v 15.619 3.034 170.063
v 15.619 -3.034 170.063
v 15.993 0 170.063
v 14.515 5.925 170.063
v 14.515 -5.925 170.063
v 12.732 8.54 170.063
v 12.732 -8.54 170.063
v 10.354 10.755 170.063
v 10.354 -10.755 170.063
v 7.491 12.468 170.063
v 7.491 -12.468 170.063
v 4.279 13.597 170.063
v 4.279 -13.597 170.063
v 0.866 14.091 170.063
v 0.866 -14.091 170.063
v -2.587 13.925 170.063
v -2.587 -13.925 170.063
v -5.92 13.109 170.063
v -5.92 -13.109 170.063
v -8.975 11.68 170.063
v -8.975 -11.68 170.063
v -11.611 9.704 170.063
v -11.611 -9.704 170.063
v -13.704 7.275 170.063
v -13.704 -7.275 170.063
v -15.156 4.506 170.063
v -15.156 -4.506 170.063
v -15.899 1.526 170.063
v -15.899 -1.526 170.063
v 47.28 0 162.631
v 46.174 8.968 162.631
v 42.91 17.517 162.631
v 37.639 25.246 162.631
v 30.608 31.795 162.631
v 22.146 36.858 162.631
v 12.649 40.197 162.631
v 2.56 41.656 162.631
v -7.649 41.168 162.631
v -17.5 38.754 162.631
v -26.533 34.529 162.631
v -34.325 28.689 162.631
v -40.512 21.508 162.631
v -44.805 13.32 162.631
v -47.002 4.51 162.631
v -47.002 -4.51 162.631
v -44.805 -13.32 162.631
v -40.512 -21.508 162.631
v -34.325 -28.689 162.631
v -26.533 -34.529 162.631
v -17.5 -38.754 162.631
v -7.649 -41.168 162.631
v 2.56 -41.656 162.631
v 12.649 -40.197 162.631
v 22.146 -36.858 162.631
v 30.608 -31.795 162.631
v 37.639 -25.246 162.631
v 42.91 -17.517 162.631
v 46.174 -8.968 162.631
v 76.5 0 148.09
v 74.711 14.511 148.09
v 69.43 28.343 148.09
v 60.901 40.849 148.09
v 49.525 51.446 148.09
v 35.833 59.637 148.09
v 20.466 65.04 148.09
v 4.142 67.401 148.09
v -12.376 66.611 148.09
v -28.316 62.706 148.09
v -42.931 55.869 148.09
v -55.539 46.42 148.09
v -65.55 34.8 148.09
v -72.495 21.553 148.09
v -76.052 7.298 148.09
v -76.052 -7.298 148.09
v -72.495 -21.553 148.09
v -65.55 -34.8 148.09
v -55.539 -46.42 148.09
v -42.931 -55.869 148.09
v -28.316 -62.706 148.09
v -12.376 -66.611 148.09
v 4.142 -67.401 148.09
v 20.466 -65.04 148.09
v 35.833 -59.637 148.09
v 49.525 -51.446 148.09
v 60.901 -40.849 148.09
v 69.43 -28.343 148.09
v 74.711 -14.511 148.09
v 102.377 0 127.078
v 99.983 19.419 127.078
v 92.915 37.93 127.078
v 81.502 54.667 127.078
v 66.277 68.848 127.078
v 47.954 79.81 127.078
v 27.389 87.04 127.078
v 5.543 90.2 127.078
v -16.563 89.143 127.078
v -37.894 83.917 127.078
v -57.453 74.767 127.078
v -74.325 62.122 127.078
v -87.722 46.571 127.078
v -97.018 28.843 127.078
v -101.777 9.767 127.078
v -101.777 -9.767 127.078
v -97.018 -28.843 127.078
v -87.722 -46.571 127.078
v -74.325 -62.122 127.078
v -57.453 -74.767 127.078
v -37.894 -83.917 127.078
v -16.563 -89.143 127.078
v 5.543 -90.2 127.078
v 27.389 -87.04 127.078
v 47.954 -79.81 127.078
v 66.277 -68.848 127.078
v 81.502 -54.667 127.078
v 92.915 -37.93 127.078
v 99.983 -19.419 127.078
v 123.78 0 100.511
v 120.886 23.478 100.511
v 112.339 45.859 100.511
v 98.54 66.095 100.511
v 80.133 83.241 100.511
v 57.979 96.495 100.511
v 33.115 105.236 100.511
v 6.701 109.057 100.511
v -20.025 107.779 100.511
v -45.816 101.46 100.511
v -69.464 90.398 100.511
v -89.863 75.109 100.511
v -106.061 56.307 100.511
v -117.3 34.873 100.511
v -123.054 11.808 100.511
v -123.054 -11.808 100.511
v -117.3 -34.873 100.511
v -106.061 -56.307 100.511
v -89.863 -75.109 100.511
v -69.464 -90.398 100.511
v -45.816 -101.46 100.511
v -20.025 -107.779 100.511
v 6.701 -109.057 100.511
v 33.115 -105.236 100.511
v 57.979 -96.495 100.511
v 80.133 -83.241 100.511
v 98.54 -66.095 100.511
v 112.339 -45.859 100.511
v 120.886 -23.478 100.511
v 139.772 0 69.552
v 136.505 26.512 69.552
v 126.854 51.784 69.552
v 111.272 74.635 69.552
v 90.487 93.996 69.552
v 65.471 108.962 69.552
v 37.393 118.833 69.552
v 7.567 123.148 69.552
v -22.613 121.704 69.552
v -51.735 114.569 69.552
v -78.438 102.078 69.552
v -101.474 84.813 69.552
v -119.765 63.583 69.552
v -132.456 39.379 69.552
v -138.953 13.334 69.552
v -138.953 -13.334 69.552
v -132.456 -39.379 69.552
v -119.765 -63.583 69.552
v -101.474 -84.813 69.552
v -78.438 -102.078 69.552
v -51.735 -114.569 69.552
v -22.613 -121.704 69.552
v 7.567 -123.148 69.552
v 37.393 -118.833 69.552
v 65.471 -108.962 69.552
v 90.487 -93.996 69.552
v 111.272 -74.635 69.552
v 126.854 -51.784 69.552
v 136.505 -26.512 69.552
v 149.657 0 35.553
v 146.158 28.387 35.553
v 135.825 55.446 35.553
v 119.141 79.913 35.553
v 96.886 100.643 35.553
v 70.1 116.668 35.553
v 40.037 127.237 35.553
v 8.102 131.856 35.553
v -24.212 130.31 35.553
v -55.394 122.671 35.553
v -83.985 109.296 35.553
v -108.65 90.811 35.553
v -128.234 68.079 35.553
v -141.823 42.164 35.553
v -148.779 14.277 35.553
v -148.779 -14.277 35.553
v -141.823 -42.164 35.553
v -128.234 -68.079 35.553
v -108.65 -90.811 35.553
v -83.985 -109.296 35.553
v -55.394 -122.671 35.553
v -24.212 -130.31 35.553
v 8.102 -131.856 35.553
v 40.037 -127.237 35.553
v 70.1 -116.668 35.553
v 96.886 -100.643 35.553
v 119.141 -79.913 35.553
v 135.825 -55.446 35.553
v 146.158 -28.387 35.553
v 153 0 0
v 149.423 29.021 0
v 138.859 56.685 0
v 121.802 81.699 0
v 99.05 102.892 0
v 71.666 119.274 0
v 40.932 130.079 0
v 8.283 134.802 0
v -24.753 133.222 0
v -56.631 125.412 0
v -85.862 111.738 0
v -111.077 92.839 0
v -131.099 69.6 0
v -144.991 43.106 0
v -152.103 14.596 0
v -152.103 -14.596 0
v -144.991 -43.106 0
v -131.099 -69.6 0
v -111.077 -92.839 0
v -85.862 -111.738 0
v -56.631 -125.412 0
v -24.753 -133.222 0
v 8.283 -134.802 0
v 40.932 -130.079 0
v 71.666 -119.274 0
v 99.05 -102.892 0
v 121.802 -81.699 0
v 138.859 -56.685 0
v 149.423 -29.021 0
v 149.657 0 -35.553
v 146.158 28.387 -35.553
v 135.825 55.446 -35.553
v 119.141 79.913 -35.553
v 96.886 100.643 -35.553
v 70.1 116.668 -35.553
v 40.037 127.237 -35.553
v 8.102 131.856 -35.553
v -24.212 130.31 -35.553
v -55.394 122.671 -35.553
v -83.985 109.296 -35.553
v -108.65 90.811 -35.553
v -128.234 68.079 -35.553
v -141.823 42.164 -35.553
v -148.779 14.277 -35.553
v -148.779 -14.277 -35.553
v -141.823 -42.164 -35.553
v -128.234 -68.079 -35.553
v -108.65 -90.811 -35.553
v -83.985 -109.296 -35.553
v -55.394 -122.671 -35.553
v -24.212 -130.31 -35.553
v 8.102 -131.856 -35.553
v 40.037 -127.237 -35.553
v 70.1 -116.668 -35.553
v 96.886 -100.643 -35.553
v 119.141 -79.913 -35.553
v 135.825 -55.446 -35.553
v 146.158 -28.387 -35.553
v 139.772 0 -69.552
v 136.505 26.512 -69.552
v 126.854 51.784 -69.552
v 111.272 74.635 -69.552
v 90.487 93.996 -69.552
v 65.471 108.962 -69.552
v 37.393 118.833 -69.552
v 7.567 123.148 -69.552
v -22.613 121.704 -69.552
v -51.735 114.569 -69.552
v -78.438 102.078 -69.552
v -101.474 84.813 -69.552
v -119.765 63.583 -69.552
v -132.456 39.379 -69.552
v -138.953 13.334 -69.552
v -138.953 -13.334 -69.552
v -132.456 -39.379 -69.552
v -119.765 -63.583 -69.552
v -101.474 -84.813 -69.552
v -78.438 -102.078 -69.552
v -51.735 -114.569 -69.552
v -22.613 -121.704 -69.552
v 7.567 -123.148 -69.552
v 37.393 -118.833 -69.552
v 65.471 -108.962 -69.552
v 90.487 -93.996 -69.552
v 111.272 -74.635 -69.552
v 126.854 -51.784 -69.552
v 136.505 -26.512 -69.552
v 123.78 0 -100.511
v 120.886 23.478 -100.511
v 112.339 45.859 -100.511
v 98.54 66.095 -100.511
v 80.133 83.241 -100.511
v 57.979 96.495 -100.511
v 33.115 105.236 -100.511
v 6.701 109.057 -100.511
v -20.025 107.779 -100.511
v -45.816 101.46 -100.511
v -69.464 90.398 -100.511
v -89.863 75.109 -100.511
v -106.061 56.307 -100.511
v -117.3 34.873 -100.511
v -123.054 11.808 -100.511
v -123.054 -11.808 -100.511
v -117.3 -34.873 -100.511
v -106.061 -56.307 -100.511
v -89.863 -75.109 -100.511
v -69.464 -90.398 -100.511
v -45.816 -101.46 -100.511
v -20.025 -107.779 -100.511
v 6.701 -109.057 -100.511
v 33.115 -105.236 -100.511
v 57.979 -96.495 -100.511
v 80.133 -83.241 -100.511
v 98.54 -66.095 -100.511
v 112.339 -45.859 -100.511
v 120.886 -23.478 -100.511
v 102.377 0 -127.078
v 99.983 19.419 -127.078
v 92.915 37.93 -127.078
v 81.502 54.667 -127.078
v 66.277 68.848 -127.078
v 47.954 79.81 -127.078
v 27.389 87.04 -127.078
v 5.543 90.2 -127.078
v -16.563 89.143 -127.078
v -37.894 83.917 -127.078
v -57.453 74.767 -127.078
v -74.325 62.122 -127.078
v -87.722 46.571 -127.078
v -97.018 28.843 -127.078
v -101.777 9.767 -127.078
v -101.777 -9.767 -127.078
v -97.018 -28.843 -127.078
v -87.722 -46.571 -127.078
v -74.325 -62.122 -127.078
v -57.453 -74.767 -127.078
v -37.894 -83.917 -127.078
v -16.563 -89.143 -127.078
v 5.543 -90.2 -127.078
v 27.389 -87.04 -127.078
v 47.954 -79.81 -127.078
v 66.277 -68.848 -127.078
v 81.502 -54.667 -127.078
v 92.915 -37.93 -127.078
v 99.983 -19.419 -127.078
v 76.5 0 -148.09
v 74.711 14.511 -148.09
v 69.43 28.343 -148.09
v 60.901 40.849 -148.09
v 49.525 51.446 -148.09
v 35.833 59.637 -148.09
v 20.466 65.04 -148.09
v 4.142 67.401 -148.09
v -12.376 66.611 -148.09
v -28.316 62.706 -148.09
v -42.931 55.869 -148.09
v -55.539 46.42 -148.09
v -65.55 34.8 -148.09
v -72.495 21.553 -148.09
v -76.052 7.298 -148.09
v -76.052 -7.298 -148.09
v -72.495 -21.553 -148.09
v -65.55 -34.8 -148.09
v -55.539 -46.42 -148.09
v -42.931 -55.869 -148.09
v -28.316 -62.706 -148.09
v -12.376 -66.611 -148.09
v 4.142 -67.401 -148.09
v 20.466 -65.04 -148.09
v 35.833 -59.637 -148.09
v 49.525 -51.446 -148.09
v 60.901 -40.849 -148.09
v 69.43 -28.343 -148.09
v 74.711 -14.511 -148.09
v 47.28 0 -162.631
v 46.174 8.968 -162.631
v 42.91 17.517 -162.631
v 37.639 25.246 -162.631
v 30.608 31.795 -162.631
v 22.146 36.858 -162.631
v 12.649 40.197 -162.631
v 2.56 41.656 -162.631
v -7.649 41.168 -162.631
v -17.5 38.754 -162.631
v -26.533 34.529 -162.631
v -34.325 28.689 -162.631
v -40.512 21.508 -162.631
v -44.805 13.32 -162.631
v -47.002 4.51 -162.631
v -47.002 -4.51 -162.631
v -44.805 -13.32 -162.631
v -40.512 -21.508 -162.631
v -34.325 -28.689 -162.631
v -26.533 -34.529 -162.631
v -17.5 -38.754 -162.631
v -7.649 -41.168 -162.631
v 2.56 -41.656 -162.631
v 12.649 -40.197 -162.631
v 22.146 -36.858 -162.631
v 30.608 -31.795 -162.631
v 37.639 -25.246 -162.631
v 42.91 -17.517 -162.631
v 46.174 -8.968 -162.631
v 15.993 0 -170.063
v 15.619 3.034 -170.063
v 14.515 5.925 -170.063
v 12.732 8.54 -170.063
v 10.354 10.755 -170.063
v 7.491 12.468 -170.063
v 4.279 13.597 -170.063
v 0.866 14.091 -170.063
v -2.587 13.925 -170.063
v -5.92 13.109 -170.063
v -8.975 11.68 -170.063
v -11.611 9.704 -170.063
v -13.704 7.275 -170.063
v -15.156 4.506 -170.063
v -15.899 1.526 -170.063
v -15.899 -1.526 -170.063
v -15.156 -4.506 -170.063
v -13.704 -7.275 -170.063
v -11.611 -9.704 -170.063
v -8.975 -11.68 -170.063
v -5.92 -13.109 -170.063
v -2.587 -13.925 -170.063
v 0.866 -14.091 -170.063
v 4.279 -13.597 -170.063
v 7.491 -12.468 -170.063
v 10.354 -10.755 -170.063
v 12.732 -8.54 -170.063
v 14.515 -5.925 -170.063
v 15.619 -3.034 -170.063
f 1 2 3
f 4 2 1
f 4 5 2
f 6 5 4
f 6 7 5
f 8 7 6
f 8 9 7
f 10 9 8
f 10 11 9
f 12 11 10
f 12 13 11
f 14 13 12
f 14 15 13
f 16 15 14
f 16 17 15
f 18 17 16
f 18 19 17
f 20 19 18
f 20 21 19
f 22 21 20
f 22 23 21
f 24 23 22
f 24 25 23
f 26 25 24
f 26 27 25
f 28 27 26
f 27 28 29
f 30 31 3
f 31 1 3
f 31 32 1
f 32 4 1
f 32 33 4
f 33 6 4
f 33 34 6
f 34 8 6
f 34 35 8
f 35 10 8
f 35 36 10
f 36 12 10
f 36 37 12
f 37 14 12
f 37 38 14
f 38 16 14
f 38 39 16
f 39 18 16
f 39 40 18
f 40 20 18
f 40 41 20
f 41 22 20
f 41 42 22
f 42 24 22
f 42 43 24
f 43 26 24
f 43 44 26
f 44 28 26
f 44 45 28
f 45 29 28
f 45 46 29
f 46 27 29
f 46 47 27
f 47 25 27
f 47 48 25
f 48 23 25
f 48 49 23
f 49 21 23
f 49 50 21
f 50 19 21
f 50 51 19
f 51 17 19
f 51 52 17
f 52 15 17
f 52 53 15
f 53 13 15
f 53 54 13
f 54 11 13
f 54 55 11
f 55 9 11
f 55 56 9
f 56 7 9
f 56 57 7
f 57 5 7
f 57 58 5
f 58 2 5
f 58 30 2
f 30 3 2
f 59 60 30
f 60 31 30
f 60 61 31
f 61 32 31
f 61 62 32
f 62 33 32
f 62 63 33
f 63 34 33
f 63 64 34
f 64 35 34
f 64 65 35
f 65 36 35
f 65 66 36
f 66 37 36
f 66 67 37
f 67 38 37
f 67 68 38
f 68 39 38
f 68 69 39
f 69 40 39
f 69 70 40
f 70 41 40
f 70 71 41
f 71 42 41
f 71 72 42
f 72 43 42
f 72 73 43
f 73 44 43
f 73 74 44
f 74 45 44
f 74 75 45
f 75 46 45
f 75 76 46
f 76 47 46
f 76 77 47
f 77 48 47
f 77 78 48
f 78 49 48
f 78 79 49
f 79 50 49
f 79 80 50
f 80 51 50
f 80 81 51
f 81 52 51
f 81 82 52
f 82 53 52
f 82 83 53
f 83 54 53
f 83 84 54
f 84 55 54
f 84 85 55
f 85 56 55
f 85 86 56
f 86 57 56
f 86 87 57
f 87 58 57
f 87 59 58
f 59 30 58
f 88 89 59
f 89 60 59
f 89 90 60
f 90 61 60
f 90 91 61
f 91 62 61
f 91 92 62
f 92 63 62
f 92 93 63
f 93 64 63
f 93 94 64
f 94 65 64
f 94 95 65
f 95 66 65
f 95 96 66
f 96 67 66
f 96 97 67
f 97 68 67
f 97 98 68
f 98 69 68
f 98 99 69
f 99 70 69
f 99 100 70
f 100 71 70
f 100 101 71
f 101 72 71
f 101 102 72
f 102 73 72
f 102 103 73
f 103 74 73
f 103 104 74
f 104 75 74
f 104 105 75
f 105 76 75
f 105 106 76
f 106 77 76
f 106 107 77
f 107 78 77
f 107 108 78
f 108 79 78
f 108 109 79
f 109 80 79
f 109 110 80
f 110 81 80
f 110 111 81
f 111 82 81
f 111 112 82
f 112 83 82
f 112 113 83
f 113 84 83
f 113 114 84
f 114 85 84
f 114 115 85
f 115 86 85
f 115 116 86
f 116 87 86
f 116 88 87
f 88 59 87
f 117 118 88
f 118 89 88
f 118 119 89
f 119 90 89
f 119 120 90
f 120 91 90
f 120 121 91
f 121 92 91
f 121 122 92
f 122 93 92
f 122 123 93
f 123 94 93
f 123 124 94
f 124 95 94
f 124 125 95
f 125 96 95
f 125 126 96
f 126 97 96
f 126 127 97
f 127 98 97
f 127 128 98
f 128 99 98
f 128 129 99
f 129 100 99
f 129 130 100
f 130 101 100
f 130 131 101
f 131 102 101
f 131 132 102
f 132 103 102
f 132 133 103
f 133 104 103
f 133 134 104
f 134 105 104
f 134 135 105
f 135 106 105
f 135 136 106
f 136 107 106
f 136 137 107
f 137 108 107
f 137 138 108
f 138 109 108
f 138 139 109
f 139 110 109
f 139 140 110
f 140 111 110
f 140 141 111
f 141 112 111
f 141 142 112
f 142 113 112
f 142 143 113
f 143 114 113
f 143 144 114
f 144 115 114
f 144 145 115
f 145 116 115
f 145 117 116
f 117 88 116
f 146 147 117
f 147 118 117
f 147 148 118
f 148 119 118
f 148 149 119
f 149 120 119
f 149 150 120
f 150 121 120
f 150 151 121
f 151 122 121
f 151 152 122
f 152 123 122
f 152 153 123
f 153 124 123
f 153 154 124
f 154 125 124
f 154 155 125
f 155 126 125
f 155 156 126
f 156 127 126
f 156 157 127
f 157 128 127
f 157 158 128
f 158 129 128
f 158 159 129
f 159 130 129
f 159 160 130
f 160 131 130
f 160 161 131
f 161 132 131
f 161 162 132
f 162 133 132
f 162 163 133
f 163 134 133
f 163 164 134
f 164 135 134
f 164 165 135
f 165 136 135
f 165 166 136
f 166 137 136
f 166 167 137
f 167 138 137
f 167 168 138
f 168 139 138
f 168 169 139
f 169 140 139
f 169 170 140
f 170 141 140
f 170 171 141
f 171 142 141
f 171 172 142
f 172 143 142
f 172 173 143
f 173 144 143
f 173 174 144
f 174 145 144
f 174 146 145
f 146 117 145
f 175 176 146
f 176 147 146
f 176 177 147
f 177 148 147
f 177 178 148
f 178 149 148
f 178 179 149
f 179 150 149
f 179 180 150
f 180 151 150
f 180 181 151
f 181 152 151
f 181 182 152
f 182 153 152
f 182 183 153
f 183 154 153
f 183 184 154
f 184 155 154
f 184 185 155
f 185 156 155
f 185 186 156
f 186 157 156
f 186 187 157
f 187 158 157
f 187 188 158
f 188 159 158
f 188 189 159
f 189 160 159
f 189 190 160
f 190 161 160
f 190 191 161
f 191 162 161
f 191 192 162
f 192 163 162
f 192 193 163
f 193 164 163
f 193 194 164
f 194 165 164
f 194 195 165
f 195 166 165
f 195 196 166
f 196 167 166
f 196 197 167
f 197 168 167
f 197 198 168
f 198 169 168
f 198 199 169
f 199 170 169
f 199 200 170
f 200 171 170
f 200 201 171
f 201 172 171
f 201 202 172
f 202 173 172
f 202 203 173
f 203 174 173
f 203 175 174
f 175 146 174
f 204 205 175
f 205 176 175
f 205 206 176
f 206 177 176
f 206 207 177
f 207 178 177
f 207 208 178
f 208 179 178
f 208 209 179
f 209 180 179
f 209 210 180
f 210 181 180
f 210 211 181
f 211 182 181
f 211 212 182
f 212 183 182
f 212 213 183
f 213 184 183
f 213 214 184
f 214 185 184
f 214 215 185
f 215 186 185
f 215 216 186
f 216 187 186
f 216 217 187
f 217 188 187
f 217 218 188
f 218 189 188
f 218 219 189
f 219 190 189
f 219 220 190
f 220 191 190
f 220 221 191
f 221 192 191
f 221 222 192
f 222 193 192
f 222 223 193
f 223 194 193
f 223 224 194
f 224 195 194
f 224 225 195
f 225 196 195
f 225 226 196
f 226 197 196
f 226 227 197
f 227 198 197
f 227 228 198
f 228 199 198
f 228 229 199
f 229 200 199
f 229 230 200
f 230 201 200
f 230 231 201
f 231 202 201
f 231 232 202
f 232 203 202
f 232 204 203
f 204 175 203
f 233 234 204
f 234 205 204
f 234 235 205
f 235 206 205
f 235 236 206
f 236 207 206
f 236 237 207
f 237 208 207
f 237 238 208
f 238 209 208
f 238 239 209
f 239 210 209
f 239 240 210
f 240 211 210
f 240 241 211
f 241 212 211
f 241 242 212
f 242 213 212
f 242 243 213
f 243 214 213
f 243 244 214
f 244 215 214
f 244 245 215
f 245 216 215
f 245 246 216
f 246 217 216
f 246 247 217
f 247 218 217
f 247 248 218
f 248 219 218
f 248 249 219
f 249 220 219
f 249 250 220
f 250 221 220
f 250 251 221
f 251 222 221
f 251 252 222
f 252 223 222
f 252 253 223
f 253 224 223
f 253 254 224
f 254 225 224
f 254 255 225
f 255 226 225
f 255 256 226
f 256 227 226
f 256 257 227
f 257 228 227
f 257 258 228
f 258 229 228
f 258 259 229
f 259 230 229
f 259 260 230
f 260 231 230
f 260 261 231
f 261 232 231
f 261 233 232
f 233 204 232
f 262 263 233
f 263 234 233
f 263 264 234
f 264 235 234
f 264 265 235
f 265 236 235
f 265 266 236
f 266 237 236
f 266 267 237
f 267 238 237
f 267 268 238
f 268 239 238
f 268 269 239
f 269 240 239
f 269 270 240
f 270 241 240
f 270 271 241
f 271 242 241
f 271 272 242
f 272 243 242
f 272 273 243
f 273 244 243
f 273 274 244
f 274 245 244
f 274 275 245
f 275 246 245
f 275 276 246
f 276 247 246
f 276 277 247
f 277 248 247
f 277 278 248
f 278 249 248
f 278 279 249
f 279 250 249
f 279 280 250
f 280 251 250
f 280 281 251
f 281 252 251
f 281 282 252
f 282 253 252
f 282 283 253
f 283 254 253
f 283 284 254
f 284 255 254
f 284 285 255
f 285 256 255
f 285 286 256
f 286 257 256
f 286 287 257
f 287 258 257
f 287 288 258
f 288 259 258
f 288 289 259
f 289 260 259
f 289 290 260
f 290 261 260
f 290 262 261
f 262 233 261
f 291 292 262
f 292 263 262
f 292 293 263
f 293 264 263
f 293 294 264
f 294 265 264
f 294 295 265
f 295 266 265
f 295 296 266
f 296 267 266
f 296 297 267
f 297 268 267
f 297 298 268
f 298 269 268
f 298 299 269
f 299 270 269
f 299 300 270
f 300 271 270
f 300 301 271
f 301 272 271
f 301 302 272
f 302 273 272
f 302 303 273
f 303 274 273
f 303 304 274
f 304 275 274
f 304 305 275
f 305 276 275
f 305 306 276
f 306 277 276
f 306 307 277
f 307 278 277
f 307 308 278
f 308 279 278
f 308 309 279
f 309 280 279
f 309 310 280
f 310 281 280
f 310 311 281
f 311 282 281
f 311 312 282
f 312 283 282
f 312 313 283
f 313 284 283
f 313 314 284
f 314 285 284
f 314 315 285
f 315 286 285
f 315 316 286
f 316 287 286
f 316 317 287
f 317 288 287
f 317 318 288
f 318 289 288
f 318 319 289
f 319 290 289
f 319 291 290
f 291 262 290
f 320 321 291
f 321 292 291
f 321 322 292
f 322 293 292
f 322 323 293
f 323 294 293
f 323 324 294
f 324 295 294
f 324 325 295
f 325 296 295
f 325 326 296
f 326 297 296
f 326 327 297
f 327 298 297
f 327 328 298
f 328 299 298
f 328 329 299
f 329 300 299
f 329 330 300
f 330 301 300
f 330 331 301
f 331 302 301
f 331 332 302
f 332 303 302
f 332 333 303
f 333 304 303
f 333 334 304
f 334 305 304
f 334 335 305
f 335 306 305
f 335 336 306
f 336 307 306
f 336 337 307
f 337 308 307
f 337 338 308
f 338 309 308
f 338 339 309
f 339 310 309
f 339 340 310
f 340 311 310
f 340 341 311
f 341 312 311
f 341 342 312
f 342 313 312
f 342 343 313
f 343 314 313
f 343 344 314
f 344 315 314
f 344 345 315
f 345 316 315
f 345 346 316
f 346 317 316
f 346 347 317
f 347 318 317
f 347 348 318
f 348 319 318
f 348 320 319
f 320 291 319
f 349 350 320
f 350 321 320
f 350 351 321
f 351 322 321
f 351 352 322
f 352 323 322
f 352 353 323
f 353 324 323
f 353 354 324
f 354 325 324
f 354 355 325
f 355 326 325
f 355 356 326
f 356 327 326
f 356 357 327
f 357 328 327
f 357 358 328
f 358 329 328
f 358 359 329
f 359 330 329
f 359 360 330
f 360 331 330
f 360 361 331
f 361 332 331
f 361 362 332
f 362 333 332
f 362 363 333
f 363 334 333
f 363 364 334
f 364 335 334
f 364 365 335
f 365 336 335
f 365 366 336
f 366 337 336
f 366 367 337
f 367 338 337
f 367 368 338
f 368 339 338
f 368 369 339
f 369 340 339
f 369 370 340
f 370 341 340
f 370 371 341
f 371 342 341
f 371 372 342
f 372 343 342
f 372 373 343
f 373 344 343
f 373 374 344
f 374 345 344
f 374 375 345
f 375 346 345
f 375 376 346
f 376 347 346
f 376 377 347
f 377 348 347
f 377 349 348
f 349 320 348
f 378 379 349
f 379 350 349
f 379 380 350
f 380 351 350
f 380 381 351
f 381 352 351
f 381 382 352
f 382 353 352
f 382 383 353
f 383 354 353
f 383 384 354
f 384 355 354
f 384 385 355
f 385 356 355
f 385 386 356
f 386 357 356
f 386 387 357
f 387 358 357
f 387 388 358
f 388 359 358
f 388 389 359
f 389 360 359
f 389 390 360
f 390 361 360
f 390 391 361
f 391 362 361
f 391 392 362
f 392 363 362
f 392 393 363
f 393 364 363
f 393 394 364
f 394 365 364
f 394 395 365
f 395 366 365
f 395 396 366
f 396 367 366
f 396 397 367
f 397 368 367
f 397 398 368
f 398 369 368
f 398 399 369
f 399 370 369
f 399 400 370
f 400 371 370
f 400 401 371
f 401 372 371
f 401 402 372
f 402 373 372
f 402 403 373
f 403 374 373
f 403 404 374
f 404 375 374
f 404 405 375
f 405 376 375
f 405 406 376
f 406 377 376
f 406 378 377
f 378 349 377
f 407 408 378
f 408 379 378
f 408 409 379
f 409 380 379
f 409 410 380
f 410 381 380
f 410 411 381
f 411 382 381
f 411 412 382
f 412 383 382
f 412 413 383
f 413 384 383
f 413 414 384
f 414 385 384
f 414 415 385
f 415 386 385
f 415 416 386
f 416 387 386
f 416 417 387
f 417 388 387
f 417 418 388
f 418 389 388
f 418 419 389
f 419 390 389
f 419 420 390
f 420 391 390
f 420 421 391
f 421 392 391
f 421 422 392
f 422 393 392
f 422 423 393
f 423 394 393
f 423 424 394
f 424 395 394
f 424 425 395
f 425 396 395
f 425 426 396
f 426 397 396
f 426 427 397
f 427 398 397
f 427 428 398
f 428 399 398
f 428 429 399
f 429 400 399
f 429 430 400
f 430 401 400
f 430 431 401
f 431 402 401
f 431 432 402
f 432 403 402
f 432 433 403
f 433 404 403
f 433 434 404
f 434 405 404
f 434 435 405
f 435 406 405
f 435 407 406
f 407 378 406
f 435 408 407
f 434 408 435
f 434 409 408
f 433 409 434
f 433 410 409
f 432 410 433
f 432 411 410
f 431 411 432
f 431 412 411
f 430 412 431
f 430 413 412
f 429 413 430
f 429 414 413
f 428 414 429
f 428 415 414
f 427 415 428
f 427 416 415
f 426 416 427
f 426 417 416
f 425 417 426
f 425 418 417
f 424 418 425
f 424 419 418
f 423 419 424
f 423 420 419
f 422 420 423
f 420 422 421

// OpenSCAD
// Generated by SolidPython 1.0.1 on 2020-07-29 00:46:53


scale(v = [17, 15, 19]) {
	sphere(r = 9);
}
/***********************************************
*********      SolidPython code:      **********
************************************************
 
# import packages: SolidPython
from solid import *
from solid.utils import *
from itertools import chain, combinations, permutations


class Resize:

    def __init__(self, scad_file):
        self.scad_file = scad_file
        #self.scad_file = import_scad(scad_file)
        # cone/cylinder param:
        self.r1 = 0
        self.r2 = 0
        self.h = 0
        # rectangular prism param:
        self.w = 0
        self.l = 0
        # ellipse param:
        self.r = 0

    # import OpenScad code (file name corresponds to shape)


    # classify shape + parameters
    def assign(self, param1, param2, param3):
        if self.scad_file == 'cone.scad':
            self.r1 = param1
            self.r2 = param2
            self.h = param3
        elif self.scad_file == 'cylinder.scad':
            self.r1 = param1
            self.r2 = param2
            self.h = param3
        elif self.scad_file == 'rectangularPrism.scad':
            self.h = param1
            self.l = param2
            self.w = param3
        else:
            self.r = param1
            self.h = param2

    # resize parameters
    def iterate(self):
        x = range(3, 20, 2)
        i = 1
        if self.scad_file == 'cone.scad':
            tempList = list(permutations(x, 2))
            for temp in tempList:
                param1 = temp[0]
                param2 = temp[1]
                filepath = 'produced_scad_files/' + 'cone' + str(param1) + '_' + str(param2) + '_' + '.scad'
                scad_render_to_file(cylinder(h=param1, r1=param2, r2=0), filepath)

        elif self.scad_file == 'cylinder.scad':
            tempList = list(permutations(x, 3))
            for temp in tempList:
                param1 = temp[0]
                param2 = temp[1]
                filepath = 'produced_scad_files/' + 'cylinder' + str(param1) + '_' + str(param2) + '_' + '.scad'
                scad_render_to_file(cylinder(h=param1, r1=param2, r2=param2), filepath)

        elif self.scad_file == 'rectangularPrism.scad':
            tempList = list(permutations(x, 3))
            for temp in tempList:
                param1 = temp[0]
                param2 = temp[1]
                param3 = temp[2]
                filepath = 'produced_scad_files/' + 'rectangularPrism' + str(param1) + '_' + str(param2) + '_' + str(
                    param3) + '.scad'
                scad_render_to_file(cube(size=(param1, param2, param3)), filepath)

        elif self.scad_file == 'ellipse.scad':
            tempList = list(permutations(x, 4))
            for temp in tempList:
                param1 = temp[0]
                param2 = temp[1]
                param3 = temp[2]
                param4 = temp[3]
                filepath = 'produced_scad_files/' + 'ellipse' + str(param1) + '_' + str(param2) + '_' + str(param3) + '_' + str(param4) + '.scad'
                scad_render_to_file(scale([param1, param2, param3])(sphere(r=param4)), filepath)

    def render_to_scadfile(self):
        scad_render_to_file(scad, 'example.scad') 
 
************************************************/
